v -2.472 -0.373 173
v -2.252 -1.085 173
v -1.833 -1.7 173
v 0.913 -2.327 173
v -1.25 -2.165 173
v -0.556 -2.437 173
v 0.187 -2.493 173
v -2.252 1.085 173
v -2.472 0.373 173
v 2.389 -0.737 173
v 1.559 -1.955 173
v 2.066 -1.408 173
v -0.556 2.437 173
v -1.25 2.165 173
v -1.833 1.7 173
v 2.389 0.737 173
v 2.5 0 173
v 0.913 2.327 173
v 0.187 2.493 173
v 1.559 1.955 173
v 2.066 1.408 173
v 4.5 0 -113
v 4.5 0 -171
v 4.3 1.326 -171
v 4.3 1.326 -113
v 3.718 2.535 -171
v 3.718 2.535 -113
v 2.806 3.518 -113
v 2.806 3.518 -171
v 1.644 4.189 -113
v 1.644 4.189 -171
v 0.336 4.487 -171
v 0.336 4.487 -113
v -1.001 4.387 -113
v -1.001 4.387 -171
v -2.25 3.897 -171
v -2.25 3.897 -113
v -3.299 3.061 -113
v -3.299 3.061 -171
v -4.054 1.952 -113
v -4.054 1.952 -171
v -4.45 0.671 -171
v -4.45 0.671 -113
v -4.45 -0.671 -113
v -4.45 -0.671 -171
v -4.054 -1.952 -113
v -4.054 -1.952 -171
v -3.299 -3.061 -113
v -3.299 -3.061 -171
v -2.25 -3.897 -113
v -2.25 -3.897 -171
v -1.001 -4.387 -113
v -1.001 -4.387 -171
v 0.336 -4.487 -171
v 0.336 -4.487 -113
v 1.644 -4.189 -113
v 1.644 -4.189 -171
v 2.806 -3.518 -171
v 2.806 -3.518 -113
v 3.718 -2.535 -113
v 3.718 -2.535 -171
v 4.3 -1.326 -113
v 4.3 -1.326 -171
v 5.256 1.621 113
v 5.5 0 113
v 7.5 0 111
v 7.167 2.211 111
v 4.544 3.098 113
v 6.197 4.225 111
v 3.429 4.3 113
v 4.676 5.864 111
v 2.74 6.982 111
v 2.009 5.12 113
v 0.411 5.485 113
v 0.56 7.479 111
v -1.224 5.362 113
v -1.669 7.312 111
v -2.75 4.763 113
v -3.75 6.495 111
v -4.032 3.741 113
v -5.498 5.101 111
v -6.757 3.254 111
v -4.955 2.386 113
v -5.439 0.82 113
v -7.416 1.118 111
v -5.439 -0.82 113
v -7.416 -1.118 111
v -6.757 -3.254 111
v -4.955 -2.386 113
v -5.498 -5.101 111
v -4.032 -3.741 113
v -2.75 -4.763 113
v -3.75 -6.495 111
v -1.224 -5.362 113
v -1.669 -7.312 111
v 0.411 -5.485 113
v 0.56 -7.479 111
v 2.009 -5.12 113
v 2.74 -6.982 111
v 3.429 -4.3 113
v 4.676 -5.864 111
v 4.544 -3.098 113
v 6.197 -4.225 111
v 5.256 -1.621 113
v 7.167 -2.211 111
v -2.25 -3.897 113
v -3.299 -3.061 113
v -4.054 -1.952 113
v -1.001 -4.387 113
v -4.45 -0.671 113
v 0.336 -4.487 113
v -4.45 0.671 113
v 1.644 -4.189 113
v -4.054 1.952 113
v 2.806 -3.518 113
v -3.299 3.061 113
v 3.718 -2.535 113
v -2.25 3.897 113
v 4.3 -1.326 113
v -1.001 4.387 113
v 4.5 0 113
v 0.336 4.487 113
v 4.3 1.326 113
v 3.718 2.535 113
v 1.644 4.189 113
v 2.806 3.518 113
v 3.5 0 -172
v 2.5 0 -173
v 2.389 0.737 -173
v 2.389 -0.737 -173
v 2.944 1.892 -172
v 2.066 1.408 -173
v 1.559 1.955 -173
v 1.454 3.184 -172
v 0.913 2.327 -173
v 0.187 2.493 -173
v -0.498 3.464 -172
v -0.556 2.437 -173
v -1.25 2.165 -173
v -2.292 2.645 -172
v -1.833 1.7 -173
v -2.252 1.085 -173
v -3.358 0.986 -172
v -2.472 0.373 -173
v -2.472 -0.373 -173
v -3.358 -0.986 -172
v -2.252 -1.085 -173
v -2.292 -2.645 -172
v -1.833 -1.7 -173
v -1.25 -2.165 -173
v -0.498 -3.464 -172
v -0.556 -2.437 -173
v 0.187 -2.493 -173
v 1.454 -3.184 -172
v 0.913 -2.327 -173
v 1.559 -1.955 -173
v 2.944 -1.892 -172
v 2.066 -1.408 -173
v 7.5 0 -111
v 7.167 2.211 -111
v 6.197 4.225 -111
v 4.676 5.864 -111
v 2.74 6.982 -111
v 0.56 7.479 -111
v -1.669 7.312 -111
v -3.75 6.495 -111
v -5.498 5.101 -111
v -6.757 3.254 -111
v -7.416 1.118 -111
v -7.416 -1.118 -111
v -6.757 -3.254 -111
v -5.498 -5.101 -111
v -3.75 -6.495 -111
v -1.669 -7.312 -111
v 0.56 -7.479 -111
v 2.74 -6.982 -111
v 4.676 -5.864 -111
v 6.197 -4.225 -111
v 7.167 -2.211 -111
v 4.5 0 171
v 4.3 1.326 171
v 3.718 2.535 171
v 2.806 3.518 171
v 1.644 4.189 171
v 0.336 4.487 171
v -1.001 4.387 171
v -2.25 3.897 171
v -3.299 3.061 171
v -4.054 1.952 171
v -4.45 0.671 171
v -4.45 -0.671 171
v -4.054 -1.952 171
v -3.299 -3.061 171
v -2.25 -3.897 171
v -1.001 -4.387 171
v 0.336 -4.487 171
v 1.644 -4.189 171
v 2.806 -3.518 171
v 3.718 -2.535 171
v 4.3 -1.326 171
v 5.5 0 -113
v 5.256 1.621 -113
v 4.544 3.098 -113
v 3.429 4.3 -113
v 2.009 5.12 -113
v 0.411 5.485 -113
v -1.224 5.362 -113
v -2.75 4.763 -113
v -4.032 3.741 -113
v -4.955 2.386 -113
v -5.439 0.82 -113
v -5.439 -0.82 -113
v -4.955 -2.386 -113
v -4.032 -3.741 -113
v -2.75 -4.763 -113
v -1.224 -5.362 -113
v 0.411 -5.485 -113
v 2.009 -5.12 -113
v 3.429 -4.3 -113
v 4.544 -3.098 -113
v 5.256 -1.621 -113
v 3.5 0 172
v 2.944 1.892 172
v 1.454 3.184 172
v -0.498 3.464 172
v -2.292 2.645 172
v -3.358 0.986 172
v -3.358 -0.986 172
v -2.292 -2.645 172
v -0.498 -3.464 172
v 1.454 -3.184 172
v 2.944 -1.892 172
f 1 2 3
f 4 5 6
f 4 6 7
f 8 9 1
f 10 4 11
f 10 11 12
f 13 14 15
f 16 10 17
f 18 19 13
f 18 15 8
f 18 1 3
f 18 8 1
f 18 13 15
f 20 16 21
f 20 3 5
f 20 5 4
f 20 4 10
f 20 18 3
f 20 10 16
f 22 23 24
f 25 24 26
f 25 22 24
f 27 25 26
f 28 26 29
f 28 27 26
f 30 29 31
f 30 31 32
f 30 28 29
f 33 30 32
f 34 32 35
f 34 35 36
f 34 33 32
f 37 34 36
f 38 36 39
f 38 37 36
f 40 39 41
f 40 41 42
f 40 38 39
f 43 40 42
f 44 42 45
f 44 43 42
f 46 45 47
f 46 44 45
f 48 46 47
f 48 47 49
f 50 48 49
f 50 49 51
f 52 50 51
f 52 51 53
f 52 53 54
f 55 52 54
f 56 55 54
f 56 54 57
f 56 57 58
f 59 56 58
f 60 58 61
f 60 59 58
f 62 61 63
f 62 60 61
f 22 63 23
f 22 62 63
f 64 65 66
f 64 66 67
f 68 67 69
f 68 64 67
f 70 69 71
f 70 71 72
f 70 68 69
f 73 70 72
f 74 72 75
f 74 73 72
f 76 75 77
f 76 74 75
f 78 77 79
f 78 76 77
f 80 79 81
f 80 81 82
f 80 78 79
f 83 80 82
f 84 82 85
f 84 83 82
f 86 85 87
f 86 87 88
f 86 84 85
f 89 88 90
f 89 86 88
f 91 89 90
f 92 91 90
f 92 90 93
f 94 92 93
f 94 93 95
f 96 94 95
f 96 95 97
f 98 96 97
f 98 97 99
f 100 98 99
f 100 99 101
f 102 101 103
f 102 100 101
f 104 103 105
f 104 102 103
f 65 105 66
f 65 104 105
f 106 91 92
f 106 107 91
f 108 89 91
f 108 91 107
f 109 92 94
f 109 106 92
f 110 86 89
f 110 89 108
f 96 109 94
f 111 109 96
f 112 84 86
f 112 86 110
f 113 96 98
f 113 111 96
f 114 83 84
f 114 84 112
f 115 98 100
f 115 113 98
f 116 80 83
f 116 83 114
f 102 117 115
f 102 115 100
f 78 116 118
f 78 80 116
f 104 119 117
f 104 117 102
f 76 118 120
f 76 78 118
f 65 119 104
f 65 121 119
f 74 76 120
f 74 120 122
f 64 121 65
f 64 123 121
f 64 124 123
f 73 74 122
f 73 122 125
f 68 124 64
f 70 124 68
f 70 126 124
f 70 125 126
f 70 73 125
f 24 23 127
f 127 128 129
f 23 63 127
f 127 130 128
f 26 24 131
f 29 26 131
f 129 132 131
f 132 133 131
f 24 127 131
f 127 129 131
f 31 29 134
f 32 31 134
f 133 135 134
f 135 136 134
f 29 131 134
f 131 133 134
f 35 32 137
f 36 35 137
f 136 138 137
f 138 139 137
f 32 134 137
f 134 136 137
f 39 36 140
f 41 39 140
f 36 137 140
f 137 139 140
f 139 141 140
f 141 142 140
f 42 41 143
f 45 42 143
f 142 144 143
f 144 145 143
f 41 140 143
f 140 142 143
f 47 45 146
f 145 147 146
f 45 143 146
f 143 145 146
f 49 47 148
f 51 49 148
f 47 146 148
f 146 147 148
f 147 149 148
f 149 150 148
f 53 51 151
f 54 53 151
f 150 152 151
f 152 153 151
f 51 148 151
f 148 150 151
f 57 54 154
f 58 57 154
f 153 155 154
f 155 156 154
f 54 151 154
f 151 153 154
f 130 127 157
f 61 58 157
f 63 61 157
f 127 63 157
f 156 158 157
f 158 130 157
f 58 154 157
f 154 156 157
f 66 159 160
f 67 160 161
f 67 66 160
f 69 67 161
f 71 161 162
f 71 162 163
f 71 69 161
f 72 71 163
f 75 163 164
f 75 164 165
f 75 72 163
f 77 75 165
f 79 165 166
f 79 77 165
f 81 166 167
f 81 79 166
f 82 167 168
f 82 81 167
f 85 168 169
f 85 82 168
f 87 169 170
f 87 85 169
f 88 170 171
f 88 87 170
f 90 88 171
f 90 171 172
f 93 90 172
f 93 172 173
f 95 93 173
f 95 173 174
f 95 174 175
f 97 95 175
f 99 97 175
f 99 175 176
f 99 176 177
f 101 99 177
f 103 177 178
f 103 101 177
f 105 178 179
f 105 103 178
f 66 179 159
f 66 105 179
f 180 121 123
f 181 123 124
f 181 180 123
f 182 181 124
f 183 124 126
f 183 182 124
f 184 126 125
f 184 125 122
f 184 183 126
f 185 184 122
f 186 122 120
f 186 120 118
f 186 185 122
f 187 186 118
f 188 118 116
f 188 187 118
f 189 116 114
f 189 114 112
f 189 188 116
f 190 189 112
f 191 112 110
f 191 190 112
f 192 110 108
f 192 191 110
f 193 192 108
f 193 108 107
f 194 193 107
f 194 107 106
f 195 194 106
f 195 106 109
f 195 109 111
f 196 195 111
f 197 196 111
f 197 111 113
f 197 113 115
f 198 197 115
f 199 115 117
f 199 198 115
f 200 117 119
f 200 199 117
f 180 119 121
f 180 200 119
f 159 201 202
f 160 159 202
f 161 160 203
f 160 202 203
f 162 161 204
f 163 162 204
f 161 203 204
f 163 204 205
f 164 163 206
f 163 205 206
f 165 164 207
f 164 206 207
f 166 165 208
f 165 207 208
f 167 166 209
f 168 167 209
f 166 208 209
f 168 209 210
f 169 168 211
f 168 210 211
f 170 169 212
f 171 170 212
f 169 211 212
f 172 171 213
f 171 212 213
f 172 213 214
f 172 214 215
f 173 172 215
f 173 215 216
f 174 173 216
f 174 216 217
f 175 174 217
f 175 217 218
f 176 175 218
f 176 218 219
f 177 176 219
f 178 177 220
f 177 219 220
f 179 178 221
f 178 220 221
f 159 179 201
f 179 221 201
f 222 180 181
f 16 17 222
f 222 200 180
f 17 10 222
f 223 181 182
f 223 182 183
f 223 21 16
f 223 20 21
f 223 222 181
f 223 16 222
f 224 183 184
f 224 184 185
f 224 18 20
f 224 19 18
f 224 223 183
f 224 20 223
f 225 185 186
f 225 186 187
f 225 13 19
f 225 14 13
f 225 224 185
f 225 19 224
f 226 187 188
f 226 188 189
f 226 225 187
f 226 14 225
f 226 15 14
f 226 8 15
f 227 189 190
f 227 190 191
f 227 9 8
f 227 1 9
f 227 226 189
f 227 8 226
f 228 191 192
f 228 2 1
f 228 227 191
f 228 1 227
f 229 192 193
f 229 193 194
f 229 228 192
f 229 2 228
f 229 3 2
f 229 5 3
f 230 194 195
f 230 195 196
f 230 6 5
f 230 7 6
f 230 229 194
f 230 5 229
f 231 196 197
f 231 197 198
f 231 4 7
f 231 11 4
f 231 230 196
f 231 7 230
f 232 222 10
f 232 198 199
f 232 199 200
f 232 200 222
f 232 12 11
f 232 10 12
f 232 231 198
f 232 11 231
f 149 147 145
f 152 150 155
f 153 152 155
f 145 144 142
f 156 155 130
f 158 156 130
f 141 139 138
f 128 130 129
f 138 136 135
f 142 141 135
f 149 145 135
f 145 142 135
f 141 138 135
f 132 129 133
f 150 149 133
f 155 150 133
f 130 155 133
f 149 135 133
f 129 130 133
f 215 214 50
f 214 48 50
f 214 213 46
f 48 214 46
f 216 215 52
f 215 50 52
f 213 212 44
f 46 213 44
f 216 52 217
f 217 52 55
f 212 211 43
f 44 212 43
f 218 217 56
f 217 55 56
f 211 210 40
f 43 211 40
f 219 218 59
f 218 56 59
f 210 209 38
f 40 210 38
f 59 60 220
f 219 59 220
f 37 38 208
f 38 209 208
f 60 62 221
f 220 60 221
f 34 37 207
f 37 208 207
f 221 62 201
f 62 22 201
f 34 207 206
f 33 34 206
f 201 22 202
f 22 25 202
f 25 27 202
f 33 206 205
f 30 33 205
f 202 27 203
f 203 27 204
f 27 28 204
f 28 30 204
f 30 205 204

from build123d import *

# Parameters (mm, degrees)
SKETCH_1_R      = 4.5
EXTRUDE_1_DEPTH = 173
EXTRUDE_START   = -60
SKETCH_2_R      = 7.5
EXTRUDE_2_DEPTH = 226
CHAMFER_1_SIZE  = 2


with BuildPart() as part:
    # 草图1 → 凸台-拉伸1 (new, symmetric)
    with BuildSketch(Plane.XY):
        Circle(SKETCH_1_R)
    extrude(amount=EXTRUDE_1_DEPTH, both=True)

    # 草图2 → 凸台-拉伸2 (add)
    with BuildSketch(Plane.XY.offset(173).offset(EXTRUDE_START)):
        Circle(SKETCH_2_R)
    extrude(amount=-EXTRUDE_2_DEPTH)

    # 倒角1
    chamfer_1_edges = [part.edges().sort_by_distance(p)[0] for p in [
        (-4.5, 0, -173),
        (-4.5, 0, 173),
        (-7.5, 0, 113),
        (-7.5, 0, -113),
    ]]
    chamfer(chamfer_1_edges, length=CHAMFER_1_SIZE)


solid = part.part
